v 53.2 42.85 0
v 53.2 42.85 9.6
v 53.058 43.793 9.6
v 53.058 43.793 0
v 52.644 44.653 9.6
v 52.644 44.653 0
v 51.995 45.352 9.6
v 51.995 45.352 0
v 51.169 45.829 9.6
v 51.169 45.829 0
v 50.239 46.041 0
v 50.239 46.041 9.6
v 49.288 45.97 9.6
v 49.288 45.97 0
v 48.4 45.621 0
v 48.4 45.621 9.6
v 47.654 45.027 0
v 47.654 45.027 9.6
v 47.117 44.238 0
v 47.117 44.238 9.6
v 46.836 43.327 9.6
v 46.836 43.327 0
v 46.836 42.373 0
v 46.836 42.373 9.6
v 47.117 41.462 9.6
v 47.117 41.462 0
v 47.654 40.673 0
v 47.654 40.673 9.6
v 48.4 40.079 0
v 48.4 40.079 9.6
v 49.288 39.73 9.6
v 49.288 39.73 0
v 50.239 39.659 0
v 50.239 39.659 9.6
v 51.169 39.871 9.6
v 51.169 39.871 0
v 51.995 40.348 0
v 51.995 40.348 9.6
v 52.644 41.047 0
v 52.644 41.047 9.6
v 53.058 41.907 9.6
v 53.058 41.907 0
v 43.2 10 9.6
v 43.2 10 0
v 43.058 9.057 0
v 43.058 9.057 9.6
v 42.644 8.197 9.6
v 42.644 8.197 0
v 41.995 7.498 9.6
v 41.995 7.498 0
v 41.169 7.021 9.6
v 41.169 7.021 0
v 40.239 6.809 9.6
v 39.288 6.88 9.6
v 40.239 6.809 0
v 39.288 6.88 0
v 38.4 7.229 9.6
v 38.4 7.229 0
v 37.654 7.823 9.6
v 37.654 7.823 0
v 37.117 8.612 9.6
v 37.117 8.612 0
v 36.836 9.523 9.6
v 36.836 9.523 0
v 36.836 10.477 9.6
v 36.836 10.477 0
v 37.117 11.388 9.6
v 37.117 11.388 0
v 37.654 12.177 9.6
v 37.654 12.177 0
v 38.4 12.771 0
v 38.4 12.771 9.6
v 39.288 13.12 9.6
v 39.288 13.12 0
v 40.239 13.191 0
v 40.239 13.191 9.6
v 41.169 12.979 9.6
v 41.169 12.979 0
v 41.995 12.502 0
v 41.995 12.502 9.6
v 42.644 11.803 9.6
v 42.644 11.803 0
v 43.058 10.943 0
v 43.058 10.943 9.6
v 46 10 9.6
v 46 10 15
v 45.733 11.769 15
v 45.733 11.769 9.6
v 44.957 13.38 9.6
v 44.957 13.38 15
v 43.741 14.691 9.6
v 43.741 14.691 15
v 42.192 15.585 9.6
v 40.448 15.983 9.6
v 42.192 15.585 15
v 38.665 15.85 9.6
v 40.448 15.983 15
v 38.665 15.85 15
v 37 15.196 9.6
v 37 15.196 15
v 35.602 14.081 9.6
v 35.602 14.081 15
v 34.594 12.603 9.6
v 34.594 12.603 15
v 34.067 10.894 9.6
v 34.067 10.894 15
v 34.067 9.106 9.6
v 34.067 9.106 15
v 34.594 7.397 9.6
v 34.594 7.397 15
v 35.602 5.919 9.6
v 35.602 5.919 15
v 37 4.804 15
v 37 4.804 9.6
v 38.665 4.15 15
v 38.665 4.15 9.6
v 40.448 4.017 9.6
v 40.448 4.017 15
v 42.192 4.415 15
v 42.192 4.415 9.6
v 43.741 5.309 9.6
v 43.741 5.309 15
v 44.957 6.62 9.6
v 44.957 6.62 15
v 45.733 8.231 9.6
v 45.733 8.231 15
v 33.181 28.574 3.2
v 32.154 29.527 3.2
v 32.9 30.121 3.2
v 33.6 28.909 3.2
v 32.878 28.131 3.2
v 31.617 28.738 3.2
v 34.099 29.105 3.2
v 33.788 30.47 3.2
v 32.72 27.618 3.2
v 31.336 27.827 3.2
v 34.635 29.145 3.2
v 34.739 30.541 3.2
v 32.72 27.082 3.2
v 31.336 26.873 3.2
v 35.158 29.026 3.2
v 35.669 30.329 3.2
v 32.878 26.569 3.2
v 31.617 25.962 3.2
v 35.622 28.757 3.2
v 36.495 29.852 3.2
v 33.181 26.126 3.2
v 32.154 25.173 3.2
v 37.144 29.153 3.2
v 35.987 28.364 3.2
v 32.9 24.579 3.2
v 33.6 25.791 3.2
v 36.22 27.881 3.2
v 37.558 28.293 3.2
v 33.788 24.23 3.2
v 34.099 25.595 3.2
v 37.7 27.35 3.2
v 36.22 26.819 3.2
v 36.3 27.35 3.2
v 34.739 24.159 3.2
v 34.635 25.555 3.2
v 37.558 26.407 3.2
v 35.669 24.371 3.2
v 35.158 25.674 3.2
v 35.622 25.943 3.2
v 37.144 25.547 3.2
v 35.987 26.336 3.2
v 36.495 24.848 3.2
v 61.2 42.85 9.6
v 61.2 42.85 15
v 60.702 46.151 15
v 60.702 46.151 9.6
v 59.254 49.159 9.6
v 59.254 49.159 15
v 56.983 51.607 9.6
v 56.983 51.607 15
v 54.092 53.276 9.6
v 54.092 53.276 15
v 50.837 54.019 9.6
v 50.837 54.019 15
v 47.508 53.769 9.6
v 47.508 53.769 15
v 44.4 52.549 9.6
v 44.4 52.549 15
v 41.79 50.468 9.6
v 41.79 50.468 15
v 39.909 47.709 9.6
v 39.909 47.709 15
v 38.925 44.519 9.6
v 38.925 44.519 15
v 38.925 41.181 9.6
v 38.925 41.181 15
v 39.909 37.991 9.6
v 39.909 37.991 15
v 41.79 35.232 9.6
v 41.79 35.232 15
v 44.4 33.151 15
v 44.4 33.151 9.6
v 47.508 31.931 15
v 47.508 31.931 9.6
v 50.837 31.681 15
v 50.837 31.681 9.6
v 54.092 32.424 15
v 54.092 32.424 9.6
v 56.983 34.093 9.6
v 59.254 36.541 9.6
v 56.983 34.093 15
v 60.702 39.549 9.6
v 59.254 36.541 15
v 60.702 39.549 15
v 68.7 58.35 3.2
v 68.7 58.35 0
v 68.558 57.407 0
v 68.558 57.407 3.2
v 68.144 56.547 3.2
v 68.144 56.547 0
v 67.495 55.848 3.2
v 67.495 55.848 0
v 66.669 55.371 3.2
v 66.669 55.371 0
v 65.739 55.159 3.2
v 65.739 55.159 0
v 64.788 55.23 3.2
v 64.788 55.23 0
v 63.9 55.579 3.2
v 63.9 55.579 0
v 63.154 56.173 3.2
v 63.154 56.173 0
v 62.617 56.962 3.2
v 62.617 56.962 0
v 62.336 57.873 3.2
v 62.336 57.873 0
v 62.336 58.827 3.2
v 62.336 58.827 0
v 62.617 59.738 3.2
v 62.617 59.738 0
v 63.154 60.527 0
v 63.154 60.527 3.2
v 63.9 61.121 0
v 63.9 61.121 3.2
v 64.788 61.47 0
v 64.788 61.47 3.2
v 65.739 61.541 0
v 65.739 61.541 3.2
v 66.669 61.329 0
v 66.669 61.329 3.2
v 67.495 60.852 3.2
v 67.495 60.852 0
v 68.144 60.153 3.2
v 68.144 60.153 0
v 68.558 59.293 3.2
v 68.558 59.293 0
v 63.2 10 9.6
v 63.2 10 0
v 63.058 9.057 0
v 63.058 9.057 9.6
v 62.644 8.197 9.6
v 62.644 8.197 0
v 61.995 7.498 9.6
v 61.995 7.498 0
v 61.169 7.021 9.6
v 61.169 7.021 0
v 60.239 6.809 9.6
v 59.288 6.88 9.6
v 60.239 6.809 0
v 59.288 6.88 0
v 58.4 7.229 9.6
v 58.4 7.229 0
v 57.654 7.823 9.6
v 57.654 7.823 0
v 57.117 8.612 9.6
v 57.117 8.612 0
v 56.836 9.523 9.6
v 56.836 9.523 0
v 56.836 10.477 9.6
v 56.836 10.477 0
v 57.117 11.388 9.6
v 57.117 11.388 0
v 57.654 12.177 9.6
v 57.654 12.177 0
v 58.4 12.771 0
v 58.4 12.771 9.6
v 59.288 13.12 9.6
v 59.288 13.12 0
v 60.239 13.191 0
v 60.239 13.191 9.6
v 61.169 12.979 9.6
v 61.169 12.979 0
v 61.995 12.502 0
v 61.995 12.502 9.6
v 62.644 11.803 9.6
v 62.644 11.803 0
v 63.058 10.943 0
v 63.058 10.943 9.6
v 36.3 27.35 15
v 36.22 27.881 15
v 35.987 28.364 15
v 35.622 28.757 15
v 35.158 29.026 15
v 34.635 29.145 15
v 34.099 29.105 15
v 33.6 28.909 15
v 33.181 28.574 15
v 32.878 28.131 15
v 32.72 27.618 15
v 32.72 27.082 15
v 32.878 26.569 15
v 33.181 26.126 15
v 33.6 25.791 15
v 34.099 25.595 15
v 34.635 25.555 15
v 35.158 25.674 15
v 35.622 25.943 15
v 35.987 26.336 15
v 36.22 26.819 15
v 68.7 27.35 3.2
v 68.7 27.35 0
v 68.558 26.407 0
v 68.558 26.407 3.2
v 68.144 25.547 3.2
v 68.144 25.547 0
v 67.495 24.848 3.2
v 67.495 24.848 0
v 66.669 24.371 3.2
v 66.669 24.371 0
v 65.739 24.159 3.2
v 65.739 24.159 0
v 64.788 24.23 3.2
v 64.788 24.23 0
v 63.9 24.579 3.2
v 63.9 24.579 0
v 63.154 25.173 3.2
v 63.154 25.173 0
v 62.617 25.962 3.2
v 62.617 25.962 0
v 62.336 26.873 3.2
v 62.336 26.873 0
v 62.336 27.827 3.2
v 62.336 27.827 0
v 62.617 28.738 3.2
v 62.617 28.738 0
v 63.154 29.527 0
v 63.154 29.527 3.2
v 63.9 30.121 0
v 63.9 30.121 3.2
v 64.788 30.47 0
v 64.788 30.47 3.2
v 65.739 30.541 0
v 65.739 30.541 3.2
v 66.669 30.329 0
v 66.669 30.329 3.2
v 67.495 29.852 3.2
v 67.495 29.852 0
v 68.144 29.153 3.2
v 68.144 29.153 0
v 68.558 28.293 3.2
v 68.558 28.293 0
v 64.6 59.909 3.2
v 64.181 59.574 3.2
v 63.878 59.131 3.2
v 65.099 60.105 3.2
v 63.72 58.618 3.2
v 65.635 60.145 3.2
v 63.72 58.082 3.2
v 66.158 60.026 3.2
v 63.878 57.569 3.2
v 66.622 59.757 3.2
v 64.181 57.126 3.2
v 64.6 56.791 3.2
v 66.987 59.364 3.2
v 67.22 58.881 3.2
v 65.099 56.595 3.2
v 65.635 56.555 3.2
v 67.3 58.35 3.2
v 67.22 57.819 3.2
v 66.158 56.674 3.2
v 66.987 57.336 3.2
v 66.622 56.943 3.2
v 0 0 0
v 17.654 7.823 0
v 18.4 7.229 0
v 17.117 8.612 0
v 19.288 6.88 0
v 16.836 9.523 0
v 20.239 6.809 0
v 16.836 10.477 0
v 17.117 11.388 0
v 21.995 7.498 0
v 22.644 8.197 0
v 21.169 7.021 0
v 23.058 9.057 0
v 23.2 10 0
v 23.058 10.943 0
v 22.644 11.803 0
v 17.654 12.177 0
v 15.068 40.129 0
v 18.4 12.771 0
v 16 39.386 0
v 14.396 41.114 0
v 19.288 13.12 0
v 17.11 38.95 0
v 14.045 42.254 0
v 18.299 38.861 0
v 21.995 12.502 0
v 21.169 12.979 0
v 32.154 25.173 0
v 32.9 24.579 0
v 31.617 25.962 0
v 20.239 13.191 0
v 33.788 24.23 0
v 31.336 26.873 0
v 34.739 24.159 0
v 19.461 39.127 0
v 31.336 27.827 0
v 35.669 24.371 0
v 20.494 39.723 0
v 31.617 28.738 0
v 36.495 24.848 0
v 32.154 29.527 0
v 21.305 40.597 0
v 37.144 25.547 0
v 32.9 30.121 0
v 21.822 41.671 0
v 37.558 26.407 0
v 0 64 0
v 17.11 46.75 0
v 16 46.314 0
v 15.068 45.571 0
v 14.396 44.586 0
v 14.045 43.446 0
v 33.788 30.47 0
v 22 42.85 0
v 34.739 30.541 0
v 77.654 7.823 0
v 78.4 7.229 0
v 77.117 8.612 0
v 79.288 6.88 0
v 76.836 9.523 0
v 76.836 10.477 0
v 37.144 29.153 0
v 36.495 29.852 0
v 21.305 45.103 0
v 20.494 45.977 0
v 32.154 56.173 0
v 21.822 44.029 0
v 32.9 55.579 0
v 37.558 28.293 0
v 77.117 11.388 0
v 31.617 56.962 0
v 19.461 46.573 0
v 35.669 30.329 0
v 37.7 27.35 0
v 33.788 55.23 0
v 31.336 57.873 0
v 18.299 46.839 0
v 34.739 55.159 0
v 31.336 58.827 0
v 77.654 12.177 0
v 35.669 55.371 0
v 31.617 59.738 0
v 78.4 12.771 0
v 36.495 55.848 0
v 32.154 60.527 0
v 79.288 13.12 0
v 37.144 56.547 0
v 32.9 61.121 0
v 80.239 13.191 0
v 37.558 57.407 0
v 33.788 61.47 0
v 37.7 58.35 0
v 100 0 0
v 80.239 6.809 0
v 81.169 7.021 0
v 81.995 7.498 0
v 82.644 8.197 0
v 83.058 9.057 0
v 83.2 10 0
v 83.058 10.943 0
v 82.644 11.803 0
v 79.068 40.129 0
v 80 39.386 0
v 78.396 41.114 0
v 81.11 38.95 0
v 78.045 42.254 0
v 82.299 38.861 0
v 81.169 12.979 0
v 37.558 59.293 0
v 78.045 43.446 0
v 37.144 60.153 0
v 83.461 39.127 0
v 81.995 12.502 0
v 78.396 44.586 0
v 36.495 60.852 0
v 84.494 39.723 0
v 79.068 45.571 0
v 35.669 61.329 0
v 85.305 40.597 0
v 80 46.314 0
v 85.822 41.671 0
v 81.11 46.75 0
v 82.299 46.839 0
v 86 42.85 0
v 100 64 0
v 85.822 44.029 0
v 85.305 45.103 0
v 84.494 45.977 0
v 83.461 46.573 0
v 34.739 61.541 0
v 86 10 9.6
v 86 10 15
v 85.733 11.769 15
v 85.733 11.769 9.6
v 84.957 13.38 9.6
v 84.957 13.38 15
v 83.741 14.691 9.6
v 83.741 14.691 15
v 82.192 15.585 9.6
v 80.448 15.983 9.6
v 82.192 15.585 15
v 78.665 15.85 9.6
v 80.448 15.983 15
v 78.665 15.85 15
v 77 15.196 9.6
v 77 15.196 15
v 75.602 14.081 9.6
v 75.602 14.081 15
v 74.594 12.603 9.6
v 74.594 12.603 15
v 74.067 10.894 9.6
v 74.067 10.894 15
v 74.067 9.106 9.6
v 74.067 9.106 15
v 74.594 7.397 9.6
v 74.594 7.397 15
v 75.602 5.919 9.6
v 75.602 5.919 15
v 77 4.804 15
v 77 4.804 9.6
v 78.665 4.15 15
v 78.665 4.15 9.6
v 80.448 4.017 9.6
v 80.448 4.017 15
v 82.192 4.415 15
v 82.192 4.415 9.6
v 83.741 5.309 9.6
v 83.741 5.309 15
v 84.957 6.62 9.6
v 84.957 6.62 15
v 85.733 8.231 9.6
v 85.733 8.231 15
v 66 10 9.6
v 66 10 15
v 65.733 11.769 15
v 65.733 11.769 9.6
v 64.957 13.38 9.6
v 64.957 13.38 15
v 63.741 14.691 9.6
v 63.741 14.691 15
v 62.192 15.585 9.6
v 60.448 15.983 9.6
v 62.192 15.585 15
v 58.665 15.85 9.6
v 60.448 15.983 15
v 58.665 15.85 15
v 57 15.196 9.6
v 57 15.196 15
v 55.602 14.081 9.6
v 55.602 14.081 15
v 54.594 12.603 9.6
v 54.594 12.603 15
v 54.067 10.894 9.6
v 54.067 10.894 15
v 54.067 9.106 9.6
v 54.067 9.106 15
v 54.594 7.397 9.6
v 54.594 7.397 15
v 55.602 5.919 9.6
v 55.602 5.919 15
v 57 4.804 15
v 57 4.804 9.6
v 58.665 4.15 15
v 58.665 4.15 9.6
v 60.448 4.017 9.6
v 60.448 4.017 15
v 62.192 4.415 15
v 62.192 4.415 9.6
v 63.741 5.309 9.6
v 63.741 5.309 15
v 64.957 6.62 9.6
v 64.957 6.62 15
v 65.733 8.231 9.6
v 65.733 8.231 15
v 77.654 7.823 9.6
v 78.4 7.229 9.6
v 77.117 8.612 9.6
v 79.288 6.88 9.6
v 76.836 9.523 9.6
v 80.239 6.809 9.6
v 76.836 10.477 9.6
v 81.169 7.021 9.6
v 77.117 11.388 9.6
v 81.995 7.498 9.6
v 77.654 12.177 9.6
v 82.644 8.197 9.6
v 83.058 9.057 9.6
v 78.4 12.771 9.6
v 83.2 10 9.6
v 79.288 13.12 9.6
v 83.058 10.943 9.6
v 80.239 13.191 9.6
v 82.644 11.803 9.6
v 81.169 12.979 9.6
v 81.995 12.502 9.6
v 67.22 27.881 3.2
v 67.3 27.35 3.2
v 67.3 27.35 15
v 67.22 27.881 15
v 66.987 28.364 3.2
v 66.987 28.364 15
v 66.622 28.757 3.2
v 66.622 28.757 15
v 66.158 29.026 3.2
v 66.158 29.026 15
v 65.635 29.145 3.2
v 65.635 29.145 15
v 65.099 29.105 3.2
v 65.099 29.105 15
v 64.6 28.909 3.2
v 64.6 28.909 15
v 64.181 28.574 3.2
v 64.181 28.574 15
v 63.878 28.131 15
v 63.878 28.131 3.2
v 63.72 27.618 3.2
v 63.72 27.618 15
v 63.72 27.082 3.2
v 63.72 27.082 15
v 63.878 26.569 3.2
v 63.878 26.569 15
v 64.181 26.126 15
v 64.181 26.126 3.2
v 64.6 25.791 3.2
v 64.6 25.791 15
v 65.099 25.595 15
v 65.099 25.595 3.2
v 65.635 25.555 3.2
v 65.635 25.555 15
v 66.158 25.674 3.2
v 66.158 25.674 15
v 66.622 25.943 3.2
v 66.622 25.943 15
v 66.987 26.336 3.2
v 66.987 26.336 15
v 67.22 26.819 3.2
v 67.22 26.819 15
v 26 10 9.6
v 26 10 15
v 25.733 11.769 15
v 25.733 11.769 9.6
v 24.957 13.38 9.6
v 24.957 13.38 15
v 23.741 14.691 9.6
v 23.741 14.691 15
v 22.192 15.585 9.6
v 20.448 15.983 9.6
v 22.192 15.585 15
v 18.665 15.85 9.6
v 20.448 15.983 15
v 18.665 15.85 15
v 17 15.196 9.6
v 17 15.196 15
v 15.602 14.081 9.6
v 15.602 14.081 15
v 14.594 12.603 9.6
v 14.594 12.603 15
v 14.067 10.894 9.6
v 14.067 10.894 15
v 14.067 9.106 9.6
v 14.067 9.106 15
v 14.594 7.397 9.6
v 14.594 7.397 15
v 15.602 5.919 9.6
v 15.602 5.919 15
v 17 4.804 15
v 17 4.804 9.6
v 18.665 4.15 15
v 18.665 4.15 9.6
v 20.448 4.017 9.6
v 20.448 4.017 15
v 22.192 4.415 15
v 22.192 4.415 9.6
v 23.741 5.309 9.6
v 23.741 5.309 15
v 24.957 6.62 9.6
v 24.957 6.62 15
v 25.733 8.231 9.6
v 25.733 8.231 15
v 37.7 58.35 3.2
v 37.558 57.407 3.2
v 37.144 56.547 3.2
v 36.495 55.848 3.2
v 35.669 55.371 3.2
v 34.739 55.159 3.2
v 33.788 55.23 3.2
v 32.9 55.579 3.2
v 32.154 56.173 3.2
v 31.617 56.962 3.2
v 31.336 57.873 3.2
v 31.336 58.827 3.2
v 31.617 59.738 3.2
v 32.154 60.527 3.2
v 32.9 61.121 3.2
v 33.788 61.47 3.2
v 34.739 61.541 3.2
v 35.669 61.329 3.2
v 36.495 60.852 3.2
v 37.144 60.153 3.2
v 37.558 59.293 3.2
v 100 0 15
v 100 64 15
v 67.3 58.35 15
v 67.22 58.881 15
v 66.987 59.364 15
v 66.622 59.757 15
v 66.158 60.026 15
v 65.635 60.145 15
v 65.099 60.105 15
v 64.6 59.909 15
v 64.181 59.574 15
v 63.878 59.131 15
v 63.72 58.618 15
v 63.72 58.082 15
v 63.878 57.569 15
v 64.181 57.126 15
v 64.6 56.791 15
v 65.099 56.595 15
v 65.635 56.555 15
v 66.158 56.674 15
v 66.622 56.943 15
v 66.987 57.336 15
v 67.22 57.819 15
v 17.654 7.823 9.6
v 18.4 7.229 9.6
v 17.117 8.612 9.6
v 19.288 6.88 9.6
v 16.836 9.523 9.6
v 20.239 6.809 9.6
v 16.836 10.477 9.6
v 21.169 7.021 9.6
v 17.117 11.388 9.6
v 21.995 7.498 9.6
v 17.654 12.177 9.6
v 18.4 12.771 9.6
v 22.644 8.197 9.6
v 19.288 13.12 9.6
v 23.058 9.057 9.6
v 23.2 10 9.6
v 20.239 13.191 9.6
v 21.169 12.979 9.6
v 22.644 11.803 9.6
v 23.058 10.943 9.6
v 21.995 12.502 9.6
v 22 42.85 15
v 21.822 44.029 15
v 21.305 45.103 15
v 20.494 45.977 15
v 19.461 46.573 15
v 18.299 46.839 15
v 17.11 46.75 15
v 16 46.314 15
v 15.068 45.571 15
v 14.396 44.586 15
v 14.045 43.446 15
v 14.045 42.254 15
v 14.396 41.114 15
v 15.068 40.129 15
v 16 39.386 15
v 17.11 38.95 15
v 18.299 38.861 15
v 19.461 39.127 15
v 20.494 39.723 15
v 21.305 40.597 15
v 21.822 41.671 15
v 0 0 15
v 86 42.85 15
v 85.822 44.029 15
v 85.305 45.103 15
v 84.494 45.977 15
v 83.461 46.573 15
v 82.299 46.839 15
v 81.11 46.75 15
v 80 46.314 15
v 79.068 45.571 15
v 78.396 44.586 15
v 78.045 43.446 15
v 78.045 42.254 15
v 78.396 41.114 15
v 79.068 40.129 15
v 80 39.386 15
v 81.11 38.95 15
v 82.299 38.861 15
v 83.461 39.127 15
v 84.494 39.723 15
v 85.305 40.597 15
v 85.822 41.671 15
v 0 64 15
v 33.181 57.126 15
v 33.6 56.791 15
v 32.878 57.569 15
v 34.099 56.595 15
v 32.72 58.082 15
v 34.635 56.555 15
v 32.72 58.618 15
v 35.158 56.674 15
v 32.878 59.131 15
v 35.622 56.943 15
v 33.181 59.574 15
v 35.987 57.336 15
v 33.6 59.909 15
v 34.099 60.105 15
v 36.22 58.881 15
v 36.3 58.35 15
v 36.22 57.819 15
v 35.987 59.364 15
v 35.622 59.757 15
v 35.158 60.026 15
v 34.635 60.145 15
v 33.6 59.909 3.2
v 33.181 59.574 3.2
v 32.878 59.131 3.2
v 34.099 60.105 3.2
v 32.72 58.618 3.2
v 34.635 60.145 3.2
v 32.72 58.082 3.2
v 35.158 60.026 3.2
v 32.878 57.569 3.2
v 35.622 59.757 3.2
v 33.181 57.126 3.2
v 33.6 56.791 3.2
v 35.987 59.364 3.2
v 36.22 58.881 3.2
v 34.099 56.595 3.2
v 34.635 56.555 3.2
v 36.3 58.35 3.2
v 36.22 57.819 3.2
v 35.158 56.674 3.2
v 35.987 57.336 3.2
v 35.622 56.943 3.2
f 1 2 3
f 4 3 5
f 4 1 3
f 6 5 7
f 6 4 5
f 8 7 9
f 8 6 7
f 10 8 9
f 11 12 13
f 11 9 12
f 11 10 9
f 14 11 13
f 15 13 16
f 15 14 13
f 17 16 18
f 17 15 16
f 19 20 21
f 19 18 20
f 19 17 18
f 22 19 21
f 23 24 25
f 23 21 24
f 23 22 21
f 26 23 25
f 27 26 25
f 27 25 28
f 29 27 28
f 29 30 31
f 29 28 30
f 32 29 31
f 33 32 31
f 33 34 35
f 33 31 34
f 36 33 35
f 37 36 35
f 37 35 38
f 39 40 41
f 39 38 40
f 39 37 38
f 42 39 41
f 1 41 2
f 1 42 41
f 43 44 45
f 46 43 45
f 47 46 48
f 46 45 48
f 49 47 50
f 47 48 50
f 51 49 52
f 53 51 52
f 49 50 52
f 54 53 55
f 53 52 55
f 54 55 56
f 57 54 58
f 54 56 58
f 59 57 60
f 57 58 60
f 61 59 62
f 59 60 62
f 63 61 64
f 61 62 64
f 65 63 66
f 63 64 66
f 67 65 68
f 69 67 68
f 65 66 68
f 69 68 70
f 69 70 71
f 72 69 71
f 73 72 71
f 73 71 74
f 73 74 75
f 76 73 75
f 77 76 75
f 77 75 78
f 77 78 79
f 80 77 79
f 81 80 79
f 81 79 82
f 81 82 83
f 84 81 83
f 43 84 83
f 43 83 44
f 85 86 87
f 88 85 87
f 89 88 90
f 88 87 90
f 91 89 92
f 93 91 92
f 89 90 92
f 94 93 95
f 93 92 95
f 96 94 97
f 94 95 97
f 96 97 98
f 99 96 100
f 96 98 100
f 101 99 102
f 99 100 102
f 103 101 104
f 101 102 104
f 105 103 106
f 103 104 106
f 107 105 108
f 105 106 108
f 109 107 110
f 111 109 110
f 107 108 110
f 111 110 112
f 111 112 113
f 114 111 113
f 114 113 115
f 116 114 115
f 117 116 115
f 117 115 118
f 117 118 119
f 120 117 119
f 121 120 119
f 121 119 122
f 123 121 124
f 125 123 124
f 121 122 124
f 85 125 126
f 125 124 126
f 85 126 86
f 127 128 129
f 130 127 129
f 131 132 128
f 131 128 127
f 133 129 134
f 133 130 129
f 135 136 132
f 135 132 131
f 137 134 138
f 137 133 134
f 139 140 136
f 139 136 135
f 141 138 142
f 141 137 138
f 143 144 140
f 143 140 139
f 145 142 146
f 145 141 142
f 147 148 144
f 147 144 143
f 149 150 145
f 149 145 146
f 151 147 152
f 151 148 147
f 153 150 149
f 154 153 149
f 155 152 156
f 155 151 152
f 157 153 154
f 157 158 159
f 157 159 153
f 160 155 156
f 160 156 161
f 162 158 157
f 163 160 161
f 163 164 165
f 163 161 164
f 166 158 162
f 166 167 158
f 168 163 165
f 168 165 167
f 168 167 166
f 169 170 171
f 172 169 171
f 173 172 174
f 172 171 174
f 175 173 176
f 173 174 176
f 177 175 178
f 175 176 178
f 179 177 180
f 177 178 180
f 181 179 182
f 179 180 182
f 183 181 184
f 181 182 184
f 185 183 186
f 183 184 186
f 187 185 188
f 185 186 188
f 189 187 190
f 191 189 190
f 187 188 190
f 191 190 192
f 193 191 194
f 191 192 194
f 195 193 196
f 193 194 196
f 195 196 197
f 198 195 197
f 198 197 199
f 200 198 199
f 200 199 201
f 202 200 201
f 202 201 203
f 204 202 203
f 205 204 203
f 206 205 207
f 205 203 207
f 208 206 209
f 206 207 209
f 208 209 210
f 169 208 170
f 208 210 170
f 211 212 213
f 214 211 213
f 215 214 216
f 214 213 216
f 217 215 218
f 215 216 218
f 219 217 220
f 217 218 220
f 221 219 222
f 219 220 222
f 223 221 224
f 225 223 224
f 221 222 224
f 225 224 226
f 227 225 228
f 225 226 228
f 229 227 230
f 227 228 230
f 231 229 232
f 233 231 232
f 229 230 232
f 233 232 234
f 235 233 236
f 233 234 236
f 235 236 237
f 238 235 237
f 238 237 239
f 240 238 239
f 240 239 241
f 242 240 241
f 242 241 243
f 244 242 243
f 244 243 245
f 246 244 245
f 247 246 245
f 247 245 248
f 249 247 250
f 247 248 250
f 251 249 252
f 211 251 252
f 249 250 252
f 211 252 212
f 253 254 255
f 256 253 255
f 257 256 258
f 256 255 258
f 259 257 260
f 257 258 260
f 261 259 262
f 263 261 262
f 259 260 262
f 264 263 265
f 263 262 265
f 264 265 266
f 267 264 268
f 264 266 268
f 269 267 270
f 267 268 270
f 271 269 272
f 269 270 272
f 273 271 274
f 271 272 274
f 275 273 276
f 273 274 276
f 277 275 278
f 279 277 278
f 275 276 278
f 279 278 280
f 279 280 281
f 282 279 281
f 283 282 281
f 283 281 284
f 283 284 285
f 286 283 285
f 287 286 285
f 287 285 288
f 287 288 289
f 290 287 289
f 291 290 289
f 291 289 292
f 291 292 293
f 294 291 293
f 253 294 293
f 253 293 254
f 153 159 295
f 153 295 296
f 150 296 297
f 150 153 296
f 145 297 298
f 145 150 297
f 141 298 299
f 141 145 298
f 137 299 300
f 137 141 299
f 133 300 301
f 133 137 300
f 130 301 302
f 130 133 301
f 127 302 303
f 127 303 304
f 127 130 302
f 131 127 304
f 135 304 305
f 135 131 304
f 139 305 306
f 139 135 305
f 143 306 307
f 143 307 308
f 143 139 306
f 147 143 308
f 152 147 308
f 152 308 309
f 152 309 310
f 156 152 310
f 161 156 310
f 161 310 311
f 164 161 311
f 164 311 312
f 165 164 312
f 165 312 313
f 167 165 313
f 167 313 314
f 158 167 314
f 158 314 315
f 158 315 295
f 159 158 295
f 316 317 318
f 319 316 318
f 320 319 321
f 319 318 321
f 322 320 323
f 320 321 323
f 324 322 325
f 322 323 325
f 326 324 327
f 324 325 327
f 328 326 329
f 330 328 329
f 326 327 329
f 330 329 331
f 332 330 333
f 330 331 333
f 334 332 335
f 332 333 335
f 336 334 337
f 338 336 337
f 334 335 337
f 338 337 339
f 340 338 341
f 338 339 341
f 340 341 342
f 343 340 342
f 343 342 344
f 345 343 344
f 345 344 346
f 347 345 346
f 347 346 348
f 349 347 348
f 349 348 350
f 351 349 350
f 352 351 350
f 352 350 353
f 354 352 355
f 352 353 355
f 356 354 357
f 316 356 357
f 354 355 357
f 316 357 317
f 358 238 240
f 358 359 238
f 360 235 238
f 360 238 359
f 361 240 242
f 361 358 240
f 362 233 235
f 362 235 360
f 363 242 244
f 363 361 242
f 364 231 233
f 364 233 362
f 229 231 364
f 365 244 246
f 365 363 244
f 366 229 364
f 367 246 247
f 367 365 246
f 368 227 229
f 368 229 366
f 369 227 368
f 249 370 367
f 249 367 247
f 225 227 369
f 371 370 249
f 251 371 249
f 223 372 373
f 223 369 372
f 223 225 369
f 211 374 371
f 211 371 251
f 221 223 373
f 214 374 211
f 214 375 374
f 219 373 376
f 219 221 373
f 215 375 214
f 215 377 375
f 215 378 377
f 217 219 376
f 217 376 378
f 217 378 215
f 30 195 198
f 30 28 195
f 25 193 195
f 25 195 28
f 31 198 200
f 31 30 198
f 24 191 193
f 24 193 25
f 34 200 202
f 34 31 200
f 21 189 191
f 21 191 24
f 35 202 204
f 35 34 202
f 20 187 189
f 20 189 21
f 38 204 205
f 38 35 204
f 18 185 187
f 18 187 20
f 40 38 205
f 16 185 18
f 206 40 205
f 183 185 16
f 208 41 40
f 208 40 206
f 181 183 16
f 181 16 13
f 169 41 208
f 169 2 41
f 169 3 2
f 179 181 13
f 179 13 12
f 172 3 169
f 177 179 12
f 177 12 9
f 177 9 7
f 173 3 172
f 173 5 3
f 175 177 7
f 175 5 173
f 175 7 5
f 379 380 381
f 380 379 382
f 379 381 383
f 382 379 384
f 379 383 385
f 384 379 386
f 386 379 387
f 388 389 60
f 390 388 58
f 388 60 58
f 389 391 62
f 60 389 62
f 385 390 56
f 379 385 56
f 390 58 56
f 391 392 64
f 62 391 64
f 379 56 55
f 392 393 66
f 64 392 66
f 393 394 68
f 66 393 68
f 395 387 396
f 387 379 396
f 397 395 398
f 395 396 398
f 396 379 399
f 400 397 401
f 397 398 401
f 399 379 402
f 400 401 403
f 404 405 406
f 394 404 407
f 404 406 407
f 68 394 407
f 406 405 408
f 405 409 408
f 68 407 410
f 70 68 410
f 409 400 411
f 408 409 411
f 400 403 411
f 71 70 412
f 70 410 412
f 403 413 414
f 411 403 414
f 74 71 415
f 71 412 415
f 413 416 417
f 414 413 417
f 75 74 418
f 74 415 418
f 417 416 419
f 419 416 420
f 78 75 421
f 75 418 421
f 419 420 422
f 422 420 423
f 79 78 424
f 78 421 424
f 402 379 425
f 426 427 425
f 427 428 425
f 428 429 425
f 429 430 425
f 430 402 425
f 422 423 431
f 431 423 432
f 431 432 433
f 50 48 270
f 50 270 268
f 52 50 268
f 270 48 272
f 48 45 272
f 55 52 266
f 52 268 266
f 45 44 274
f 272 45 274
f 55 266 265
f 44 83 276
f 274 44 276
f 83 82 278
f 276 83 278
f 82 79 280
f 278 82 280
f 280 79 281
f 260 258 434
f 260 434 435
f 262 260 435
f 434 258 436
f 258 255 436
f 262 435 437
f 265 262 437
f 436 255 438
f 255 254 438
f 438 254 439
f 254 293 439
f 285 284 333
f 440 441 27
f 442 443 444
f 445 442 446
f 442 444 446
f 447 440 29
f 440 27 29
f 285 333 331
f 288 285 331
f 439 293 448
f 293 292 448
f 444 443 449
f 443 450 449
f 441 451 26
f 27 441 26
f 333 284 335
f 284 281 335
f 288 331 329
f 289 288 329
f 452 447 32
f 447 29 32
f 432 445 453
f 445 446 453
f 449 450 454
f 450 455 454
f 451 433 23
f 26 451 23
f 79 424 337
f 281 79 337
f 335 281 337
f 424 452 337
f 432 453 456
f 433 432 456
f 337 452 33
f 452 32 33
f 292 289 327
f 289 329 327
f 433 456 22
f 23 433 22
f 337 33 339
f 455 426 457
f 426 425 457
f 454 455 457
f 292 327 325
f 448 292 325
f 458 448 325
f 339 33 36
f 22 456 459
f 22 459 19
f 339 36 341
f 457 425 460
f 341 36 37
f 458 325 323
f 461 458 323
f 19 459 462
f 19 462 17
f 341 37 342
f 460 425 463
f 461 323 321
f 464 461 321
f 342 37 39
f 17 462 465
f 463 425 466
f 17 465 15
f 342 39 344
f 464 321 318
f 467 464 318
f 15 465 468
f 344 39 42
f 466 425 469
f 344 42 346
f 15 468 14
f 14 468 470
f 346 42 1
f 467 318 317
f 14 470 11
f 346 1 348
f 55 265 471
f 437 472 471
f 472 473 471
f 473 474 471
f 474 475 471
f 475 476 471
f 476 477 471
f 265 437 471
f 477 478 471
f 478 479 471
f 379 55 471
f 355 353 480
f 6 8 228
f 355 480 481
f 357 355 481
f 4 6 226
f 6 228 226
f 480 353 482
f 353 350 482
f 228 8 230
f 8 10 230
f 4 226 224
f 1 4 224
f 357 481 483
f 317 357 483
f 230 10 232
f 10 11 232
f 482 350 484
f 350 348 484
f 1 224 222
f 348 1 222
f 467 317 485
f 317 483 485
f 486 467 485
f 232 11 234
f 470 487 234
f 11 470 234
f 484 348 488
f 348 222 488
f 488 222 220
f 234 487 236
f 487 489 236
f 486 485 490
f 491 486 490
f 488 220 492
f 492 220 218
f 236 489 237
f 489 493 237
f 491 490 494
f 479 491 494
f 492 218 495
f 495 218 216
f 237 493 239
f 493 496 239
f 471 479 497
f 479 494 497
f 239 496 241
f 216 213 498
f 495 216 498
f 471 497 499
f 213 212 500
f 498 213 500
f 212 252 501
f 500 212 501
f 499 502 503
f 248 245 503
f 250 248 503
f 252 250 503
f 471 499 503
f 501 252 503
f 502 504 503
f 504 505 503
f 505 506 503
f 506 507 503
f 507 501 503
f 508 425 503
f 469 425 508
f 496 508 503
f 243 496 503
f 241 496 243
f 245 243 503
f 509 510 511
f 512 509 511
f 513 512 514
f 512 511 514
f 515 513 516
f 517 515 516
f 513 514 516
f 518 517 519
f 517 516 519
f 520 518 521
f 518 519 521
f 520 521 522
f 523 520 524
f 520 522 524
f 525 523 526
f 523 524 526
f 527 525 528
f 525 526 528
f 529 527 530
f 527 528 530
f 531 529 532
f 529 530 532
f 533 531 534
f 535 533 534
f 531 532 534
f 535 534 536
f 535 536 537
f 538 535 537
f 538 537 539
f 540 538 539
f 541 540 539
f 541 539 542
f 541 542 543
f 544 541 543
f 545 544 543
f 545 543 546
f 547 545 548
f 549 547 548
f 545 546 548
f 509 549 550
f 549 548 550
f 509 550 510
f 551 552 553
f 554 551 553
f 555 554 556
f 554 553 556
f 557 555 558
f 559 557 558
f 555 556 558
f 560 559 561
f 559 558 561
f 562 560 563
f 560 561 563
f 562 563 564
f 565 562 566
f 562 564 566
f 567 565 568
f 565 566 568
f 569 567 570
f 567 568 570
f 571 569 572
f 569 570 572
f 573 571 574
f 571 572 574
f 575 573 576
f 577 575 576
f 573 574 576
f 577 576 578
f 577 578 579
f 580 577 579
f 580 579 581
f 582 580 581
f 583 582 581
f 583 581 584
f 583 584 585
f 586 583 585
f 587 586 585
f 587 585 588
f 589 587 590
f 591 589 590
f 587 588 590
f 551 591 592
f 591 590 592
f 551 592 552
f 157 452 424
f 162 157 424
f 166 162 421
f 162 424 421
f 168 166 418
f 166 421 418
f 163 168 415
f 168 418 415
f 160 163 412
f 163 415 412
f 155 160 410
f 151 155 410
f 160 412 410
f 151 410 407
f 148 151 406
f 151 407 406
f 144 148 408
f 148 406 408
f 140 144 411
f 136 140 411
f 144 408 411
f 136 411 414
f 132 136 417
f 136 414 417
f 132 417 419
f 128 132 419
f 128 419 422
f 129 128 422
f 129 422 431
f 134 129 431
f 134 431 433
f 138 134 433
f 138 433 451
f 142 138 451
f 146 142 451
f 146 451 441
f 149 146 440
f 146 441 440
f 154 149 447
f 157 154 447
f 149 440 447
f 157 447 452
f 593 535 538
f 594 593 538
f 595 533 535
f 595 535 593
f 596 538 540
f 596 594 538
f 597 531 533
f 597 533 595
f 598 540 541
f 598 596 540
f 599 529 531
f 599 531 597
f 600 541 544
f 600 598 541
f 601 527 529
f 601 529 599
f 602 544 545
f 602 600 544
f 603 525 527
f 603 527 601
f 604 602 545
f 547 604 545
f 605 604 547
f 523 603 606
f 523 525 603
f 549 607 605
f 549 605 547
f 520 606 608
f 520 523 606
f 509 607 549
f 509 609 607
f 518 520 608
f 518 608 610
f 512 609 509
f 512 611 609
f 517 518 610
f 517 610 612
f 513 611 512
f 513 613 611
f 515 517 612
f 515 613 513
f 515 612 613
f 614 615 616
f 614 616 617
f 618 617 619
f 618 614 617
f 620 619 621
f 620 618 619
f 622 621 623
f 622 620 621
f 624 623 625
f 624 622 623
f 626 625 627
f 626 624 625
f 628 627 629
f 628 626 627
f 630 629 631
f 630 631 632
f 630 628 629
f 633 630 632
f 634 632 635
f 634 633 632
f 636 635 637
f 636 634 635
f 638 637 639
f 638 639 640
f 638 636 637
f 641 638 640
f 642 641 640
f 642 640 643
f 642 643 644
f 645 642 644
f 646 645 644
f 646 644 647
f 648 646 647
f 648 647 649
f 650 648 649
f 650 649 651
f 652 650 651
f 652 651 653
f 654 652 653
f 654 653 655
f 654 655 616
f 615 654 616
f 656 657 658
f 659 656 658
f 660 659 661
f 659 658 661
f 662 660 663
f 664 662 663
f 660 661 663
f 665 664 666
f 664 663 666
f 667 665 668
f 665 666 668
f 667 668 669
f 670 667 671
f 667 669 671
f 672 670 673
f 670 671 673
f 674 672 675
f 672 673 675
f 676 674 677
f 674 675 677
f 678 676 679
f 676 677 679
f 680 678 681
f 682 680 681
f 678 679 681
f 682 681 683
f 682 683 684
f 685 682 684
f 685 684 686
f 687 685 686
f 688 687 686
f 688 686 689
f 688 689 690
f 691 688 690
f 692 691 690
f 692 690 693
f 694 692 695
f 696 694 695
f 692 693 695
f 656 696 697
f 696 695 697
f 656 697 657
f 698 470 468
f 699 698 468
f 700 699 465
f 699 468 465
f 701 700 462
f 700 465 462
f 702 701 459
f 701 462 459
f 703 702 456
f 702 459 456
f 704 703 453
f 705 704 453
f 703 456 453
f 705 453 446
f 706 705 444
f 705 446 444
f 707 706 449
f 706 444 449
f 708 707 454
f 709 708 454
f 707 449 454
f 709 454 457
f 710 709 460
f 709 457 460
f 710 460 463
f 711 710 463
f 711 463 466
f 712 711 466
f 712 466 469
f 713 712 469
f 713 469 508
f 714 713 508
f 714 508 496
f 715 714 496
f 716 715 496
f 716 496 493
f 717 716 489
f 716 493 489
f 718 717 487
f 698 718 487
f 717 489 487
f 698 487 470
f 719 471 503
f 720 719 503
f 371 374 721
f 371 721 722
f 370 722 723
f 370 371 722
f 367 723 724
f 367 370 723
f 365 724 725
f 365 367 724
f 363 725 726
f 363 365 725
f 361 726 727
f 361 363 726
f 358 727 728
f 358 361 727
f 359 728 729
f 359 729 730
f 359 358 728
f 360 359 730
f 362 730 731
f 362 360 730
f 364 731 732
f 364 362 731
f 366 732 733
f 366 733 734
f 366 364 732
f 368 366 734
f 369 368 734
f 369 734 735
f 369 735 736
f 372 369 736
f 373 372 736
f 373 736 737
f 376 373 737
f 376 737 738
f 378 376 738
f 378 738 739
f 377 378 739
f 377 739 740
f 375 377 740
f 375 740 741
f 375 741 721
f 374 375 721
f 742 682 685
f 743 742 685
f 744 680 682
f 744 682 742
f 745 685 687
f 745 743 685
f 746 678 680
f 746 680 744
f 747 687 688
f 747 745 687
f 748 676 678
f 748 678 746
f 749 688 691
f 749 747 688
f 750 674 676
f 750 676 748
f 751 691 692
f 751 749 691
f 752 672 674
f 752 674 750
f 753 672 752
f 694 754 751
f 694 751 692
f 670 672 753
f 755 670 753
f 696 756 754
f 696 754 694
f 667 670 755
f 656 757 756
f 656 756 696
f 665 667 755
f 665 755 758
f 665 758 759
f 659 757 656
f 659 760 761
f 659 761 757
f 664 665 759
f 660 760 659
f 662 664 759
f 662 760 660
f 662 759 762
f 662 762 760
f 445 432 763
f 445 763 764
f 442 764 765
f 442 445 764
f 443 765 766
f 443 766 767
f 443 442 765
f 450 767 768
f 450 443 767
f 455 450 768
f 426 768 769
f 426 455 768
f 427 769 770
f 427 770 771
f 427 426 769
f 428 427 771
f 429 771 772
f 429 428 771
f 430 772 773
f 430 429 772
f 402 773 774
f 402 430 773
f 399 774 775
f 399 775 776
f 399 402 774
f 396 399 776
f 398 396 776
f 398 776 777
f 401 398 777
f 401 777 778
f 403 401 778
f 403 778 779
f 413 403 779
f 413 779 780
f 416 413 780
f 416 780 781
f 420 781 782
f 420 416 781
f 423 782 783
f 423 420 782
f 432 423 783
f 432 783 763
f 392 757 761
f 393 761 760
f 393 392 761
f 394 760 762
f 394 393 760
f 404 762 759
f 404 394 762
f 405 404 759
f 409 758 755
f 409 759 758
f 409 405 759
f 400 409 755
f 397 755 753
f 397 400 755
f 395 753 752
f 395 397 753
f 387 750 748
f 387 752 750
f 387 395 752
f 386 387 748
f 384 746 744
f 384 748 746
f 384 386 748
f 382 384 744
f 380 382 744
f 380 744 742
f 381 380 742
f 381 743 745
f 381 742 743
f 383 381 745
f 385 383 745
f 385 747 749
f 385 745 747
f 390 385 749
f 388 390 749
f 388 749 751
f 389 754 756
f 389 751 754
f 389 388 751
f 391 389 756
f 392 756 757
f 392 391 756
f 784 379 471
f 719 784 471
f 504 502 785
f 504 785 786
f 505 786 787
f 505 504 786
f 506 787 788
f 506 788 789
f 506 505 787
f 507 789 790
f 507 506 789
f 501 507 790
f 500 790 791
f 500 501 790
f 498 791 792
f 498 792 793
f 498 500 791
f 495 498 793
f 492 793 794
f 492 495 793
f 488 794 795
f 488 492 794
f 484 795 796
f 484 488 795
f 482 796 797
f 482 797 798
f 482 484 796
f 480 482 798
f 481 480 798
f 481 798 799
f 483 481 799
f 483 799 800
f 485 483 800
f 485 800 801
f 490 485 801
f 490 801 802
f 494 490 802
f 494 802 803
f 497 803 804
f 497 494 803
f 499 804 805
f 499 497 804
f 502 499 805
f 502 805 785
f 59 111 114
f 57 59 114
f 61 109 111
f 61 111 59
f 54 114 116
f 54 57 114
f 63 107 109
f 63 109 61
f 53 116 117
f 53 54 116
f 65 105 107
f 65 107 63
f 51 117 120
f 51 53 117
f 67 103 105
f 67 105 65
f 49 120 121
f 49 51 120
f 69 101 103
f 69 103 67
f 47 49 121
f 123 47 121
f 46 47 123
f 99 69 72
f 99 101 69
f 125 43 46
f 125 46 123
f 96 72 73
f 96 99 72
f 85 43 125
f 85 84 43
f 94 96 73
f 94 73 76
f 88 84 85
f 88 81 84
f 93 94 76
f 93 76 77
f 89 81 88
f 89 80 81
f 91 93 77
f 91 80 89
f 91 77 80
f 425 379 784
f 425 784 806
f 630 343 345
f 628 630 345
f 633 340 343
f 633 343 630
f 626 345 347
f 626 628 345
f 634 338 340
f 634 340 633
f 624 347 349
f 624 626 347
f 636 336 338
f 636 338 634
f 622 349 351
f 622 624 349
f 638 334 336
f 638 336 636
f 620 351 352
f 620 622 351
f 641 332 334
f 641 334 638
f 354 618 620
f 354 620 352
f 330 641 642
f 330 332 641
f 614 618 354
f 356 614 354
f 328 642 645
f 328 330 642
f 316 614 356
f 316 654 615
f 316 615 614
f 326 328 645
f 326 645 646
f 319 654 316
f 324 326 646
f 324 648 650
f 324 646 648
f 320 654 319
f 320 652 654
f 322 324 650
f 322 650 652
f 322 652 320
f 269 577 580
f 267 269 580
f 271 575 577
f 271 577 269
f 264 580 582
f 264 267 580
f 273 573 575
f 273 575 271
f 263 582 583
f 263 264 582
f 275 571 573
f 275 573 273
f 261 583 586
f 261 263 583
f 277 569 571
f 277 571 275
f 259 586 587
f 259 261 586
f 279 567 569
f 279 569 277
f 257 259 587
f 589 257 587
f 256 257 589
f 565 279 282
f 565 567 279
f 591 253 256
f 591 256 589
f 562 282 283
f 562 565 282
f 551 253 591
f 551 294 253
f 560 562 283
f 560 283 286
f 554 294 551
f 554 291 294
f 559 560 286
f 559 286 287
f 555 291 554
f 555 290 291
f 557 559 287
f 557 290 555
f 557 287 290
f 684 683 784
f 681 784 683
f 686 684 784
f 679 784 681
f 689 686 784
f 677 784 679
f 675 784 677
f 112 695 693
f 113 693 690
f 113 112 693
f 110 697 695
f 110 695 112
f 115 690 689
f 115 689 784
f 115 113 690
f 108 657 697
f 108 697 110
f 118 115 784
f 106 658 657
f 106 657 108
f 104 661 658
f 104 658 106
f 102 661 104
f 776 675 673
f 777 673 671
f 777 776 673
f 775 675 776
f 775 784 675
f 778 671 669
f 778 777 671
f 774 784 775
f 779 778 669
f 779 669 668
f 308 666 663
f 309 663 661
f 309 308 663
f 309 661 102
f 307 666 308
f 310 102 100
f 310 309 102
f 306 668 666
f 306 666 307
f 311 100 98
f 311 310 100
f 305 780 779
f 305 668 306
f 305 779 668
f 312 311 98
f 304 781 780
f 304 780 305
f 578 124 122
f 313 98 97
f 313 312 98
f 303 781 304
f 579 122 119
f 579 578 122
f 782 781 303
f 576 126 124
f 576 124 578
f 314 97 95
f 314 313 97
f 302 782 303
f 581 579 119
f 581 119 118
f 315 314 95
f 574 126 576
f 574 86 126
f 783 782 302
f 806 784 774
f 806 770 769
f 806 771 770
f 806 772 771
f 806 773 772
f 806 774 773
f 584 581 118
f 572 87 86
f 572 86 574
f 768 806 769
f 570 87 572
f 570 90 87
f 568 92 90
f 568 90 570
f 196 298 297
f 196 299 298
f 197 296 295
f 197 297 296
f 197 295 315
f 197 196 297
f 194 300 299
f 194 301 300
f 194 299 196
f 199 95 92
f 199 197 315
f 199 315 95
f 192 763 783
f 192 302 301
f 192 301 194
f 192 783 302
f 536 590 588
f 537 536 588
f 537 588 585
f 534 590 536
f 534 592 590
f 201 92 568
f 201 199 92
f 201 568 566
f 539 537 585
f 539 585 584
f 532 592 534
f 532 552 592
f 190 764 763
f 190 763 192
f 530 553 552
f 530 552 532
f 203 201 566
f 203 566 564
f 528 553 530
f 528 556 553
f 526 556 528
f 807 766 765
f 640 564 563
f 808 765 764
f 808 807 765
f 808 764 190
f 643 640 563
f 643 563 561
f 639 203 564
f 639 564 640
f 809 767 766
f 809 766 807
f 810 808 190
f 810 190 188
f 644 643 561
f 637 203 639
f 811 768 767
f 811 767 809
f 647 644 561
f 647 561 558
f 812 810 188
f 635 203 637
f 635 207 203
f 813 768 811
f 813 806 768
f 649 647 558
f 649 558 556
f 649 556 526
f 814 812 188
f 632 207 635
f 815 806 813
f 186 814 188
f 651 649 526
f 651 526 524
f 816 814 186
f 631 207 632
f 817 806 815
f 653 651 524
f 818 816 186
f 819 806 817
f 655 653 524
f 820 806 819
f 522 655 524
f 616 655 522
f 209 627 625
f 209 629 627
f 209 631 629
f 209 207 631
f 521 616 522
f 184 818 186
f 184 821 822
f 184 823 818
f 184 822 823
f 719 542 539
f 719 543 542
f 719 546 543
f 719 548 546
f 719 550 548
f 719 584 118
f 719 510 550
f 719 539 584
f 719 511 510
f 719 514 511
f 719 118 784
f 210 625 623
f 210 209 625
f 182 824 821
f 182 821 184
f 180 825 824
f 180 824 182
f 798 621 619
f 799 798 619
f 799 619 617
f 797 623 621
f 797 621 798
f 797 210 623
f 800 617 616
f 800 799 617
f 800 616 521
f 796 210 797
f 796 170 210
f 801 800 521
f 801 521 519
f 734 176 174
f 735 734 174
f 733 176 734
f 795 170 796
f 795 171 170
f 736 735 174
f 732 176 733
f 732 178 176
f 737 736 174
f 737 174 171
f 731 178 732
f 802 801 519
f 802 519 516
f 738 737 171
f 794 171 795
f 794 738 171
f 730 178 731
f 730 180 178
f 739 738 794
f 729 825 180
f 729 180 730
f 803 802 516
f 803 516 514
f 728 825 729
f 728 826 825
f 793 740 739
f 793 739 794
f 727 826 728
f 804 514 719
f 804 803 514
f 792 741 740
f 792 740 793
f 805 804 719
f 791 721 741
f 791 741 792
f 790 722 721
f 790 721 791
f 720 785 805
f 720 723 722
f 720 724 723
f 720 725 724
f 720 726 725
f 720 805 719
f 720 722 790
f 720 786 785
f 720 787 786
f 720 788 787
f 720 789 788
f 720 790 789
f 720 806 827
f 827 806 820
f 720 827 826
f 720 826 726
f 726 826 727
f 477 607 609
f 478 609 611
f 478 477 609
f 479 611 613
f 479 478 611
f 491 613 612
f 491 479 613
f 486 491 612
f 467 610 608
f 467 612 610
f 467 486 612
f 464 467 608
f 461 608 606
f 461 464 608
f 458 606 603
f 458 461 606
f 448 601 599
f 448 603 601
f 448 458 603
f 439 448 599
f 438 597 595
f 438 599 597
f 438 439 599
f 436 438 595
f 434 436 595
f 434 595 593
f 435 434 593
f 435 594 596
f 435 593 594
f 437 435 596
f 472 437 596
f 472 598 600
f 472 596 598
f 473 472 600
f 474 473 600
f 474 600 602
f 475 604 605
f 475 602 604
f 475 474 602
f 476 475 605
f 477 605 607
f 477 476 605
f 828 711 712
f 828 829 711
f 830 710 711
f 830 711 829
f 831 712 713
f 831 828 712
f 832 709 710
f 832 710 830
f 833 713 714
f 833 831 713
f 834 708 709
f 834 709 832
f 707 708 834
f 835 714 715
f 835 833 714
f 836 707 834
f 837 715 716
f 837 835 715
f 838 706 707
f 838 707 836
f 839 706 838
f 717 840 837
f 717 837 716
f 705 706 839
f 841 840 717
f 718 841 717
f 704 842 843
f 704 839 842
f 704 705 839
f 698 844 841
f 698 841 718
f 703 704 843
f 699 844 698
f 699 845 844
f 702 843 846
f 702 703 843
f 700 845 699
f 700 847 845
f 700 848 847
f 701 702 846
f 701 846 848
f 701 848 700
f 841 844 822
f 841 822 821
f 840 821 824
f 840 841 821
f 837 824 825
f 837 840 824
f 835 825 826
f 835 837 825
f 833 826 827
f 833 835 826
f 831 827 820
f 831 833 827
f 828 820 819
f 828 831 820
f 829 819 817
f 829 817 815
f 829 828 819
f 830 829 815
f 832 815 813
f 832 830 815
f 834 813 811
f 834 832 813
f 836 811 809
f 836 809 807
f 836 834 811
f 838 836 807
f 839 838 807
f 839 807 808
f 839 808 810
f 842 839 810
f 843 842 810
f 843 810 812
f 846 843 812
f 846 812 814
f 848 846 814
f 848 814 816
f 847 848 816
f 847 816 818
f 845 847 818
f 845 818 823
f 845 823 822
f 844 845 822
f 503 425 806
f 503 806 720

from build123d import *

# Parameters (mm, degrees)
SKETCH_W        = 100
SKETCH_H        = 64
SKETCH_R        = 3.2
SKETCH_R_2      = 1.8
SKETCH_R_3      = 4
PAD_DEPTH       = 15
SKETCH001_R     = 11.2
SKETCH001_R_2   = 6
POCKET_DEPTH    = 5.4
SKETCH002_R     = 3.2
POCKET001_DEPTH = 3.2
SKETCH003_R     = 6
POCKET002_DEPTH = 5.4
SKETCH004_R     = 3.2
POCKET003_DEPTH = 15


with BuildPart() as part:
    # Sketch → Pad (new body)
    with BuildSketch(Plane.XY):
        with Locations((50, 32)):
            Rectangle(SKETCH_W, SKETCH_H)
        with Locations((50, 42.85)):
            Circle(SKETCH_R, mode=Mode.SUBTRACT)
        with Locations((65.5, 58.35)):
            Circle(SKETCH_R_2, mode=Mode.SUBTRACT)
        with Locations((65.5, 27.35)):
            Circle(SKETCH_R_2, mode=Mode.SUBTRACT)
        with Locations((34.5, 27.35)):
            Circle(SKETCH_R_2, mode=Mode.SUBTRACT)
        with Locations((34.5, 58.35)):
            Circle(SKETCH_R_2, mode=Mode.SUBTRACT)
        with Locations((20, 10)):
            Circle(SKETCH_R, mode=Mode.SUBTRACT)
        with Locations((80, 10)):
            Circle(SKETCH_R, mode=Mode.SUBTRACT)
        with Locations((82, 42.85)):
            Circle(SKETCH_R_3, mode=Mode.SUBTRACT)
        with Locations((18, 42.85)):
            Circle(SKETCH_R_3, mode=Mode.SUBTRACT)
    extrude(amount=PAD_DEPTH)

    # Sketch001 (on Face15 of Pad) → Pocket (cut)
    with BuildSketch(Plane.XY.offset(15)):
        with Locations((50, 42.85)):
            Circle(SKETCH001_R)
        with Locations((20, 10)):
            Circle(SKETCH001_R_2)
        with Locations((80, 10)):
            Circle(SKETCH001_R_2)
    extrude(amount=-POCKET_DEPTH, mode=Mode.SUBTRACT)

    # Sketch002 (on Face4 of Pocket) → Pocket001 (cut)
    with BuildSketch(Plane(origin=(0, 0, 0), x_dir=(1, 0, 0), z_dir=(0, 0, -1))):
        with Locations((34.5, -27.35)):
            Circle(SKETCH002_R)
        with Locations((65.5, -27.35)):
            Circle(SKETCH002_R)
        with Locations((34.5, -58.35)):
            Circle(SKETCH002_R)
        with Locations((65.5, -58.35)):
            Circle(SKETCH002_R)
    extrude(amount=-POCKET001_DEPTH, mode=Mode.SUBTRACT)

    # Sketch003 (on Face5 of Pocket001) → Pocket002 (cut)
    with BuildSketch(Plane.XY.offset(15)):
        with Locations((40, 10)):
            Circle(SKETCH003_R)
        with Locations((60, 10)):
            Circle(SKETCH003_R)
    extrude(amount=-POCKET002_DEPTH, mode=Mode.SUBTRACT)

    # Sketch004 (on Face4 of Pocket002) → Pocket003 (cut)
    with BuildSketch(Plane(origin=(0, 0, 0), x_dir=(1, 0, 0), z_dir=(0, 0, -1))):
        with Locations((40, -10)):
            Circle(SKETCH004_R)
        with Locations((60, -10)):
            Circle(SKETCH004_R)
    extrude(amount=-POCKET003_DEPTH, mode=Mode.SUBTRACT)


solid = part.part
